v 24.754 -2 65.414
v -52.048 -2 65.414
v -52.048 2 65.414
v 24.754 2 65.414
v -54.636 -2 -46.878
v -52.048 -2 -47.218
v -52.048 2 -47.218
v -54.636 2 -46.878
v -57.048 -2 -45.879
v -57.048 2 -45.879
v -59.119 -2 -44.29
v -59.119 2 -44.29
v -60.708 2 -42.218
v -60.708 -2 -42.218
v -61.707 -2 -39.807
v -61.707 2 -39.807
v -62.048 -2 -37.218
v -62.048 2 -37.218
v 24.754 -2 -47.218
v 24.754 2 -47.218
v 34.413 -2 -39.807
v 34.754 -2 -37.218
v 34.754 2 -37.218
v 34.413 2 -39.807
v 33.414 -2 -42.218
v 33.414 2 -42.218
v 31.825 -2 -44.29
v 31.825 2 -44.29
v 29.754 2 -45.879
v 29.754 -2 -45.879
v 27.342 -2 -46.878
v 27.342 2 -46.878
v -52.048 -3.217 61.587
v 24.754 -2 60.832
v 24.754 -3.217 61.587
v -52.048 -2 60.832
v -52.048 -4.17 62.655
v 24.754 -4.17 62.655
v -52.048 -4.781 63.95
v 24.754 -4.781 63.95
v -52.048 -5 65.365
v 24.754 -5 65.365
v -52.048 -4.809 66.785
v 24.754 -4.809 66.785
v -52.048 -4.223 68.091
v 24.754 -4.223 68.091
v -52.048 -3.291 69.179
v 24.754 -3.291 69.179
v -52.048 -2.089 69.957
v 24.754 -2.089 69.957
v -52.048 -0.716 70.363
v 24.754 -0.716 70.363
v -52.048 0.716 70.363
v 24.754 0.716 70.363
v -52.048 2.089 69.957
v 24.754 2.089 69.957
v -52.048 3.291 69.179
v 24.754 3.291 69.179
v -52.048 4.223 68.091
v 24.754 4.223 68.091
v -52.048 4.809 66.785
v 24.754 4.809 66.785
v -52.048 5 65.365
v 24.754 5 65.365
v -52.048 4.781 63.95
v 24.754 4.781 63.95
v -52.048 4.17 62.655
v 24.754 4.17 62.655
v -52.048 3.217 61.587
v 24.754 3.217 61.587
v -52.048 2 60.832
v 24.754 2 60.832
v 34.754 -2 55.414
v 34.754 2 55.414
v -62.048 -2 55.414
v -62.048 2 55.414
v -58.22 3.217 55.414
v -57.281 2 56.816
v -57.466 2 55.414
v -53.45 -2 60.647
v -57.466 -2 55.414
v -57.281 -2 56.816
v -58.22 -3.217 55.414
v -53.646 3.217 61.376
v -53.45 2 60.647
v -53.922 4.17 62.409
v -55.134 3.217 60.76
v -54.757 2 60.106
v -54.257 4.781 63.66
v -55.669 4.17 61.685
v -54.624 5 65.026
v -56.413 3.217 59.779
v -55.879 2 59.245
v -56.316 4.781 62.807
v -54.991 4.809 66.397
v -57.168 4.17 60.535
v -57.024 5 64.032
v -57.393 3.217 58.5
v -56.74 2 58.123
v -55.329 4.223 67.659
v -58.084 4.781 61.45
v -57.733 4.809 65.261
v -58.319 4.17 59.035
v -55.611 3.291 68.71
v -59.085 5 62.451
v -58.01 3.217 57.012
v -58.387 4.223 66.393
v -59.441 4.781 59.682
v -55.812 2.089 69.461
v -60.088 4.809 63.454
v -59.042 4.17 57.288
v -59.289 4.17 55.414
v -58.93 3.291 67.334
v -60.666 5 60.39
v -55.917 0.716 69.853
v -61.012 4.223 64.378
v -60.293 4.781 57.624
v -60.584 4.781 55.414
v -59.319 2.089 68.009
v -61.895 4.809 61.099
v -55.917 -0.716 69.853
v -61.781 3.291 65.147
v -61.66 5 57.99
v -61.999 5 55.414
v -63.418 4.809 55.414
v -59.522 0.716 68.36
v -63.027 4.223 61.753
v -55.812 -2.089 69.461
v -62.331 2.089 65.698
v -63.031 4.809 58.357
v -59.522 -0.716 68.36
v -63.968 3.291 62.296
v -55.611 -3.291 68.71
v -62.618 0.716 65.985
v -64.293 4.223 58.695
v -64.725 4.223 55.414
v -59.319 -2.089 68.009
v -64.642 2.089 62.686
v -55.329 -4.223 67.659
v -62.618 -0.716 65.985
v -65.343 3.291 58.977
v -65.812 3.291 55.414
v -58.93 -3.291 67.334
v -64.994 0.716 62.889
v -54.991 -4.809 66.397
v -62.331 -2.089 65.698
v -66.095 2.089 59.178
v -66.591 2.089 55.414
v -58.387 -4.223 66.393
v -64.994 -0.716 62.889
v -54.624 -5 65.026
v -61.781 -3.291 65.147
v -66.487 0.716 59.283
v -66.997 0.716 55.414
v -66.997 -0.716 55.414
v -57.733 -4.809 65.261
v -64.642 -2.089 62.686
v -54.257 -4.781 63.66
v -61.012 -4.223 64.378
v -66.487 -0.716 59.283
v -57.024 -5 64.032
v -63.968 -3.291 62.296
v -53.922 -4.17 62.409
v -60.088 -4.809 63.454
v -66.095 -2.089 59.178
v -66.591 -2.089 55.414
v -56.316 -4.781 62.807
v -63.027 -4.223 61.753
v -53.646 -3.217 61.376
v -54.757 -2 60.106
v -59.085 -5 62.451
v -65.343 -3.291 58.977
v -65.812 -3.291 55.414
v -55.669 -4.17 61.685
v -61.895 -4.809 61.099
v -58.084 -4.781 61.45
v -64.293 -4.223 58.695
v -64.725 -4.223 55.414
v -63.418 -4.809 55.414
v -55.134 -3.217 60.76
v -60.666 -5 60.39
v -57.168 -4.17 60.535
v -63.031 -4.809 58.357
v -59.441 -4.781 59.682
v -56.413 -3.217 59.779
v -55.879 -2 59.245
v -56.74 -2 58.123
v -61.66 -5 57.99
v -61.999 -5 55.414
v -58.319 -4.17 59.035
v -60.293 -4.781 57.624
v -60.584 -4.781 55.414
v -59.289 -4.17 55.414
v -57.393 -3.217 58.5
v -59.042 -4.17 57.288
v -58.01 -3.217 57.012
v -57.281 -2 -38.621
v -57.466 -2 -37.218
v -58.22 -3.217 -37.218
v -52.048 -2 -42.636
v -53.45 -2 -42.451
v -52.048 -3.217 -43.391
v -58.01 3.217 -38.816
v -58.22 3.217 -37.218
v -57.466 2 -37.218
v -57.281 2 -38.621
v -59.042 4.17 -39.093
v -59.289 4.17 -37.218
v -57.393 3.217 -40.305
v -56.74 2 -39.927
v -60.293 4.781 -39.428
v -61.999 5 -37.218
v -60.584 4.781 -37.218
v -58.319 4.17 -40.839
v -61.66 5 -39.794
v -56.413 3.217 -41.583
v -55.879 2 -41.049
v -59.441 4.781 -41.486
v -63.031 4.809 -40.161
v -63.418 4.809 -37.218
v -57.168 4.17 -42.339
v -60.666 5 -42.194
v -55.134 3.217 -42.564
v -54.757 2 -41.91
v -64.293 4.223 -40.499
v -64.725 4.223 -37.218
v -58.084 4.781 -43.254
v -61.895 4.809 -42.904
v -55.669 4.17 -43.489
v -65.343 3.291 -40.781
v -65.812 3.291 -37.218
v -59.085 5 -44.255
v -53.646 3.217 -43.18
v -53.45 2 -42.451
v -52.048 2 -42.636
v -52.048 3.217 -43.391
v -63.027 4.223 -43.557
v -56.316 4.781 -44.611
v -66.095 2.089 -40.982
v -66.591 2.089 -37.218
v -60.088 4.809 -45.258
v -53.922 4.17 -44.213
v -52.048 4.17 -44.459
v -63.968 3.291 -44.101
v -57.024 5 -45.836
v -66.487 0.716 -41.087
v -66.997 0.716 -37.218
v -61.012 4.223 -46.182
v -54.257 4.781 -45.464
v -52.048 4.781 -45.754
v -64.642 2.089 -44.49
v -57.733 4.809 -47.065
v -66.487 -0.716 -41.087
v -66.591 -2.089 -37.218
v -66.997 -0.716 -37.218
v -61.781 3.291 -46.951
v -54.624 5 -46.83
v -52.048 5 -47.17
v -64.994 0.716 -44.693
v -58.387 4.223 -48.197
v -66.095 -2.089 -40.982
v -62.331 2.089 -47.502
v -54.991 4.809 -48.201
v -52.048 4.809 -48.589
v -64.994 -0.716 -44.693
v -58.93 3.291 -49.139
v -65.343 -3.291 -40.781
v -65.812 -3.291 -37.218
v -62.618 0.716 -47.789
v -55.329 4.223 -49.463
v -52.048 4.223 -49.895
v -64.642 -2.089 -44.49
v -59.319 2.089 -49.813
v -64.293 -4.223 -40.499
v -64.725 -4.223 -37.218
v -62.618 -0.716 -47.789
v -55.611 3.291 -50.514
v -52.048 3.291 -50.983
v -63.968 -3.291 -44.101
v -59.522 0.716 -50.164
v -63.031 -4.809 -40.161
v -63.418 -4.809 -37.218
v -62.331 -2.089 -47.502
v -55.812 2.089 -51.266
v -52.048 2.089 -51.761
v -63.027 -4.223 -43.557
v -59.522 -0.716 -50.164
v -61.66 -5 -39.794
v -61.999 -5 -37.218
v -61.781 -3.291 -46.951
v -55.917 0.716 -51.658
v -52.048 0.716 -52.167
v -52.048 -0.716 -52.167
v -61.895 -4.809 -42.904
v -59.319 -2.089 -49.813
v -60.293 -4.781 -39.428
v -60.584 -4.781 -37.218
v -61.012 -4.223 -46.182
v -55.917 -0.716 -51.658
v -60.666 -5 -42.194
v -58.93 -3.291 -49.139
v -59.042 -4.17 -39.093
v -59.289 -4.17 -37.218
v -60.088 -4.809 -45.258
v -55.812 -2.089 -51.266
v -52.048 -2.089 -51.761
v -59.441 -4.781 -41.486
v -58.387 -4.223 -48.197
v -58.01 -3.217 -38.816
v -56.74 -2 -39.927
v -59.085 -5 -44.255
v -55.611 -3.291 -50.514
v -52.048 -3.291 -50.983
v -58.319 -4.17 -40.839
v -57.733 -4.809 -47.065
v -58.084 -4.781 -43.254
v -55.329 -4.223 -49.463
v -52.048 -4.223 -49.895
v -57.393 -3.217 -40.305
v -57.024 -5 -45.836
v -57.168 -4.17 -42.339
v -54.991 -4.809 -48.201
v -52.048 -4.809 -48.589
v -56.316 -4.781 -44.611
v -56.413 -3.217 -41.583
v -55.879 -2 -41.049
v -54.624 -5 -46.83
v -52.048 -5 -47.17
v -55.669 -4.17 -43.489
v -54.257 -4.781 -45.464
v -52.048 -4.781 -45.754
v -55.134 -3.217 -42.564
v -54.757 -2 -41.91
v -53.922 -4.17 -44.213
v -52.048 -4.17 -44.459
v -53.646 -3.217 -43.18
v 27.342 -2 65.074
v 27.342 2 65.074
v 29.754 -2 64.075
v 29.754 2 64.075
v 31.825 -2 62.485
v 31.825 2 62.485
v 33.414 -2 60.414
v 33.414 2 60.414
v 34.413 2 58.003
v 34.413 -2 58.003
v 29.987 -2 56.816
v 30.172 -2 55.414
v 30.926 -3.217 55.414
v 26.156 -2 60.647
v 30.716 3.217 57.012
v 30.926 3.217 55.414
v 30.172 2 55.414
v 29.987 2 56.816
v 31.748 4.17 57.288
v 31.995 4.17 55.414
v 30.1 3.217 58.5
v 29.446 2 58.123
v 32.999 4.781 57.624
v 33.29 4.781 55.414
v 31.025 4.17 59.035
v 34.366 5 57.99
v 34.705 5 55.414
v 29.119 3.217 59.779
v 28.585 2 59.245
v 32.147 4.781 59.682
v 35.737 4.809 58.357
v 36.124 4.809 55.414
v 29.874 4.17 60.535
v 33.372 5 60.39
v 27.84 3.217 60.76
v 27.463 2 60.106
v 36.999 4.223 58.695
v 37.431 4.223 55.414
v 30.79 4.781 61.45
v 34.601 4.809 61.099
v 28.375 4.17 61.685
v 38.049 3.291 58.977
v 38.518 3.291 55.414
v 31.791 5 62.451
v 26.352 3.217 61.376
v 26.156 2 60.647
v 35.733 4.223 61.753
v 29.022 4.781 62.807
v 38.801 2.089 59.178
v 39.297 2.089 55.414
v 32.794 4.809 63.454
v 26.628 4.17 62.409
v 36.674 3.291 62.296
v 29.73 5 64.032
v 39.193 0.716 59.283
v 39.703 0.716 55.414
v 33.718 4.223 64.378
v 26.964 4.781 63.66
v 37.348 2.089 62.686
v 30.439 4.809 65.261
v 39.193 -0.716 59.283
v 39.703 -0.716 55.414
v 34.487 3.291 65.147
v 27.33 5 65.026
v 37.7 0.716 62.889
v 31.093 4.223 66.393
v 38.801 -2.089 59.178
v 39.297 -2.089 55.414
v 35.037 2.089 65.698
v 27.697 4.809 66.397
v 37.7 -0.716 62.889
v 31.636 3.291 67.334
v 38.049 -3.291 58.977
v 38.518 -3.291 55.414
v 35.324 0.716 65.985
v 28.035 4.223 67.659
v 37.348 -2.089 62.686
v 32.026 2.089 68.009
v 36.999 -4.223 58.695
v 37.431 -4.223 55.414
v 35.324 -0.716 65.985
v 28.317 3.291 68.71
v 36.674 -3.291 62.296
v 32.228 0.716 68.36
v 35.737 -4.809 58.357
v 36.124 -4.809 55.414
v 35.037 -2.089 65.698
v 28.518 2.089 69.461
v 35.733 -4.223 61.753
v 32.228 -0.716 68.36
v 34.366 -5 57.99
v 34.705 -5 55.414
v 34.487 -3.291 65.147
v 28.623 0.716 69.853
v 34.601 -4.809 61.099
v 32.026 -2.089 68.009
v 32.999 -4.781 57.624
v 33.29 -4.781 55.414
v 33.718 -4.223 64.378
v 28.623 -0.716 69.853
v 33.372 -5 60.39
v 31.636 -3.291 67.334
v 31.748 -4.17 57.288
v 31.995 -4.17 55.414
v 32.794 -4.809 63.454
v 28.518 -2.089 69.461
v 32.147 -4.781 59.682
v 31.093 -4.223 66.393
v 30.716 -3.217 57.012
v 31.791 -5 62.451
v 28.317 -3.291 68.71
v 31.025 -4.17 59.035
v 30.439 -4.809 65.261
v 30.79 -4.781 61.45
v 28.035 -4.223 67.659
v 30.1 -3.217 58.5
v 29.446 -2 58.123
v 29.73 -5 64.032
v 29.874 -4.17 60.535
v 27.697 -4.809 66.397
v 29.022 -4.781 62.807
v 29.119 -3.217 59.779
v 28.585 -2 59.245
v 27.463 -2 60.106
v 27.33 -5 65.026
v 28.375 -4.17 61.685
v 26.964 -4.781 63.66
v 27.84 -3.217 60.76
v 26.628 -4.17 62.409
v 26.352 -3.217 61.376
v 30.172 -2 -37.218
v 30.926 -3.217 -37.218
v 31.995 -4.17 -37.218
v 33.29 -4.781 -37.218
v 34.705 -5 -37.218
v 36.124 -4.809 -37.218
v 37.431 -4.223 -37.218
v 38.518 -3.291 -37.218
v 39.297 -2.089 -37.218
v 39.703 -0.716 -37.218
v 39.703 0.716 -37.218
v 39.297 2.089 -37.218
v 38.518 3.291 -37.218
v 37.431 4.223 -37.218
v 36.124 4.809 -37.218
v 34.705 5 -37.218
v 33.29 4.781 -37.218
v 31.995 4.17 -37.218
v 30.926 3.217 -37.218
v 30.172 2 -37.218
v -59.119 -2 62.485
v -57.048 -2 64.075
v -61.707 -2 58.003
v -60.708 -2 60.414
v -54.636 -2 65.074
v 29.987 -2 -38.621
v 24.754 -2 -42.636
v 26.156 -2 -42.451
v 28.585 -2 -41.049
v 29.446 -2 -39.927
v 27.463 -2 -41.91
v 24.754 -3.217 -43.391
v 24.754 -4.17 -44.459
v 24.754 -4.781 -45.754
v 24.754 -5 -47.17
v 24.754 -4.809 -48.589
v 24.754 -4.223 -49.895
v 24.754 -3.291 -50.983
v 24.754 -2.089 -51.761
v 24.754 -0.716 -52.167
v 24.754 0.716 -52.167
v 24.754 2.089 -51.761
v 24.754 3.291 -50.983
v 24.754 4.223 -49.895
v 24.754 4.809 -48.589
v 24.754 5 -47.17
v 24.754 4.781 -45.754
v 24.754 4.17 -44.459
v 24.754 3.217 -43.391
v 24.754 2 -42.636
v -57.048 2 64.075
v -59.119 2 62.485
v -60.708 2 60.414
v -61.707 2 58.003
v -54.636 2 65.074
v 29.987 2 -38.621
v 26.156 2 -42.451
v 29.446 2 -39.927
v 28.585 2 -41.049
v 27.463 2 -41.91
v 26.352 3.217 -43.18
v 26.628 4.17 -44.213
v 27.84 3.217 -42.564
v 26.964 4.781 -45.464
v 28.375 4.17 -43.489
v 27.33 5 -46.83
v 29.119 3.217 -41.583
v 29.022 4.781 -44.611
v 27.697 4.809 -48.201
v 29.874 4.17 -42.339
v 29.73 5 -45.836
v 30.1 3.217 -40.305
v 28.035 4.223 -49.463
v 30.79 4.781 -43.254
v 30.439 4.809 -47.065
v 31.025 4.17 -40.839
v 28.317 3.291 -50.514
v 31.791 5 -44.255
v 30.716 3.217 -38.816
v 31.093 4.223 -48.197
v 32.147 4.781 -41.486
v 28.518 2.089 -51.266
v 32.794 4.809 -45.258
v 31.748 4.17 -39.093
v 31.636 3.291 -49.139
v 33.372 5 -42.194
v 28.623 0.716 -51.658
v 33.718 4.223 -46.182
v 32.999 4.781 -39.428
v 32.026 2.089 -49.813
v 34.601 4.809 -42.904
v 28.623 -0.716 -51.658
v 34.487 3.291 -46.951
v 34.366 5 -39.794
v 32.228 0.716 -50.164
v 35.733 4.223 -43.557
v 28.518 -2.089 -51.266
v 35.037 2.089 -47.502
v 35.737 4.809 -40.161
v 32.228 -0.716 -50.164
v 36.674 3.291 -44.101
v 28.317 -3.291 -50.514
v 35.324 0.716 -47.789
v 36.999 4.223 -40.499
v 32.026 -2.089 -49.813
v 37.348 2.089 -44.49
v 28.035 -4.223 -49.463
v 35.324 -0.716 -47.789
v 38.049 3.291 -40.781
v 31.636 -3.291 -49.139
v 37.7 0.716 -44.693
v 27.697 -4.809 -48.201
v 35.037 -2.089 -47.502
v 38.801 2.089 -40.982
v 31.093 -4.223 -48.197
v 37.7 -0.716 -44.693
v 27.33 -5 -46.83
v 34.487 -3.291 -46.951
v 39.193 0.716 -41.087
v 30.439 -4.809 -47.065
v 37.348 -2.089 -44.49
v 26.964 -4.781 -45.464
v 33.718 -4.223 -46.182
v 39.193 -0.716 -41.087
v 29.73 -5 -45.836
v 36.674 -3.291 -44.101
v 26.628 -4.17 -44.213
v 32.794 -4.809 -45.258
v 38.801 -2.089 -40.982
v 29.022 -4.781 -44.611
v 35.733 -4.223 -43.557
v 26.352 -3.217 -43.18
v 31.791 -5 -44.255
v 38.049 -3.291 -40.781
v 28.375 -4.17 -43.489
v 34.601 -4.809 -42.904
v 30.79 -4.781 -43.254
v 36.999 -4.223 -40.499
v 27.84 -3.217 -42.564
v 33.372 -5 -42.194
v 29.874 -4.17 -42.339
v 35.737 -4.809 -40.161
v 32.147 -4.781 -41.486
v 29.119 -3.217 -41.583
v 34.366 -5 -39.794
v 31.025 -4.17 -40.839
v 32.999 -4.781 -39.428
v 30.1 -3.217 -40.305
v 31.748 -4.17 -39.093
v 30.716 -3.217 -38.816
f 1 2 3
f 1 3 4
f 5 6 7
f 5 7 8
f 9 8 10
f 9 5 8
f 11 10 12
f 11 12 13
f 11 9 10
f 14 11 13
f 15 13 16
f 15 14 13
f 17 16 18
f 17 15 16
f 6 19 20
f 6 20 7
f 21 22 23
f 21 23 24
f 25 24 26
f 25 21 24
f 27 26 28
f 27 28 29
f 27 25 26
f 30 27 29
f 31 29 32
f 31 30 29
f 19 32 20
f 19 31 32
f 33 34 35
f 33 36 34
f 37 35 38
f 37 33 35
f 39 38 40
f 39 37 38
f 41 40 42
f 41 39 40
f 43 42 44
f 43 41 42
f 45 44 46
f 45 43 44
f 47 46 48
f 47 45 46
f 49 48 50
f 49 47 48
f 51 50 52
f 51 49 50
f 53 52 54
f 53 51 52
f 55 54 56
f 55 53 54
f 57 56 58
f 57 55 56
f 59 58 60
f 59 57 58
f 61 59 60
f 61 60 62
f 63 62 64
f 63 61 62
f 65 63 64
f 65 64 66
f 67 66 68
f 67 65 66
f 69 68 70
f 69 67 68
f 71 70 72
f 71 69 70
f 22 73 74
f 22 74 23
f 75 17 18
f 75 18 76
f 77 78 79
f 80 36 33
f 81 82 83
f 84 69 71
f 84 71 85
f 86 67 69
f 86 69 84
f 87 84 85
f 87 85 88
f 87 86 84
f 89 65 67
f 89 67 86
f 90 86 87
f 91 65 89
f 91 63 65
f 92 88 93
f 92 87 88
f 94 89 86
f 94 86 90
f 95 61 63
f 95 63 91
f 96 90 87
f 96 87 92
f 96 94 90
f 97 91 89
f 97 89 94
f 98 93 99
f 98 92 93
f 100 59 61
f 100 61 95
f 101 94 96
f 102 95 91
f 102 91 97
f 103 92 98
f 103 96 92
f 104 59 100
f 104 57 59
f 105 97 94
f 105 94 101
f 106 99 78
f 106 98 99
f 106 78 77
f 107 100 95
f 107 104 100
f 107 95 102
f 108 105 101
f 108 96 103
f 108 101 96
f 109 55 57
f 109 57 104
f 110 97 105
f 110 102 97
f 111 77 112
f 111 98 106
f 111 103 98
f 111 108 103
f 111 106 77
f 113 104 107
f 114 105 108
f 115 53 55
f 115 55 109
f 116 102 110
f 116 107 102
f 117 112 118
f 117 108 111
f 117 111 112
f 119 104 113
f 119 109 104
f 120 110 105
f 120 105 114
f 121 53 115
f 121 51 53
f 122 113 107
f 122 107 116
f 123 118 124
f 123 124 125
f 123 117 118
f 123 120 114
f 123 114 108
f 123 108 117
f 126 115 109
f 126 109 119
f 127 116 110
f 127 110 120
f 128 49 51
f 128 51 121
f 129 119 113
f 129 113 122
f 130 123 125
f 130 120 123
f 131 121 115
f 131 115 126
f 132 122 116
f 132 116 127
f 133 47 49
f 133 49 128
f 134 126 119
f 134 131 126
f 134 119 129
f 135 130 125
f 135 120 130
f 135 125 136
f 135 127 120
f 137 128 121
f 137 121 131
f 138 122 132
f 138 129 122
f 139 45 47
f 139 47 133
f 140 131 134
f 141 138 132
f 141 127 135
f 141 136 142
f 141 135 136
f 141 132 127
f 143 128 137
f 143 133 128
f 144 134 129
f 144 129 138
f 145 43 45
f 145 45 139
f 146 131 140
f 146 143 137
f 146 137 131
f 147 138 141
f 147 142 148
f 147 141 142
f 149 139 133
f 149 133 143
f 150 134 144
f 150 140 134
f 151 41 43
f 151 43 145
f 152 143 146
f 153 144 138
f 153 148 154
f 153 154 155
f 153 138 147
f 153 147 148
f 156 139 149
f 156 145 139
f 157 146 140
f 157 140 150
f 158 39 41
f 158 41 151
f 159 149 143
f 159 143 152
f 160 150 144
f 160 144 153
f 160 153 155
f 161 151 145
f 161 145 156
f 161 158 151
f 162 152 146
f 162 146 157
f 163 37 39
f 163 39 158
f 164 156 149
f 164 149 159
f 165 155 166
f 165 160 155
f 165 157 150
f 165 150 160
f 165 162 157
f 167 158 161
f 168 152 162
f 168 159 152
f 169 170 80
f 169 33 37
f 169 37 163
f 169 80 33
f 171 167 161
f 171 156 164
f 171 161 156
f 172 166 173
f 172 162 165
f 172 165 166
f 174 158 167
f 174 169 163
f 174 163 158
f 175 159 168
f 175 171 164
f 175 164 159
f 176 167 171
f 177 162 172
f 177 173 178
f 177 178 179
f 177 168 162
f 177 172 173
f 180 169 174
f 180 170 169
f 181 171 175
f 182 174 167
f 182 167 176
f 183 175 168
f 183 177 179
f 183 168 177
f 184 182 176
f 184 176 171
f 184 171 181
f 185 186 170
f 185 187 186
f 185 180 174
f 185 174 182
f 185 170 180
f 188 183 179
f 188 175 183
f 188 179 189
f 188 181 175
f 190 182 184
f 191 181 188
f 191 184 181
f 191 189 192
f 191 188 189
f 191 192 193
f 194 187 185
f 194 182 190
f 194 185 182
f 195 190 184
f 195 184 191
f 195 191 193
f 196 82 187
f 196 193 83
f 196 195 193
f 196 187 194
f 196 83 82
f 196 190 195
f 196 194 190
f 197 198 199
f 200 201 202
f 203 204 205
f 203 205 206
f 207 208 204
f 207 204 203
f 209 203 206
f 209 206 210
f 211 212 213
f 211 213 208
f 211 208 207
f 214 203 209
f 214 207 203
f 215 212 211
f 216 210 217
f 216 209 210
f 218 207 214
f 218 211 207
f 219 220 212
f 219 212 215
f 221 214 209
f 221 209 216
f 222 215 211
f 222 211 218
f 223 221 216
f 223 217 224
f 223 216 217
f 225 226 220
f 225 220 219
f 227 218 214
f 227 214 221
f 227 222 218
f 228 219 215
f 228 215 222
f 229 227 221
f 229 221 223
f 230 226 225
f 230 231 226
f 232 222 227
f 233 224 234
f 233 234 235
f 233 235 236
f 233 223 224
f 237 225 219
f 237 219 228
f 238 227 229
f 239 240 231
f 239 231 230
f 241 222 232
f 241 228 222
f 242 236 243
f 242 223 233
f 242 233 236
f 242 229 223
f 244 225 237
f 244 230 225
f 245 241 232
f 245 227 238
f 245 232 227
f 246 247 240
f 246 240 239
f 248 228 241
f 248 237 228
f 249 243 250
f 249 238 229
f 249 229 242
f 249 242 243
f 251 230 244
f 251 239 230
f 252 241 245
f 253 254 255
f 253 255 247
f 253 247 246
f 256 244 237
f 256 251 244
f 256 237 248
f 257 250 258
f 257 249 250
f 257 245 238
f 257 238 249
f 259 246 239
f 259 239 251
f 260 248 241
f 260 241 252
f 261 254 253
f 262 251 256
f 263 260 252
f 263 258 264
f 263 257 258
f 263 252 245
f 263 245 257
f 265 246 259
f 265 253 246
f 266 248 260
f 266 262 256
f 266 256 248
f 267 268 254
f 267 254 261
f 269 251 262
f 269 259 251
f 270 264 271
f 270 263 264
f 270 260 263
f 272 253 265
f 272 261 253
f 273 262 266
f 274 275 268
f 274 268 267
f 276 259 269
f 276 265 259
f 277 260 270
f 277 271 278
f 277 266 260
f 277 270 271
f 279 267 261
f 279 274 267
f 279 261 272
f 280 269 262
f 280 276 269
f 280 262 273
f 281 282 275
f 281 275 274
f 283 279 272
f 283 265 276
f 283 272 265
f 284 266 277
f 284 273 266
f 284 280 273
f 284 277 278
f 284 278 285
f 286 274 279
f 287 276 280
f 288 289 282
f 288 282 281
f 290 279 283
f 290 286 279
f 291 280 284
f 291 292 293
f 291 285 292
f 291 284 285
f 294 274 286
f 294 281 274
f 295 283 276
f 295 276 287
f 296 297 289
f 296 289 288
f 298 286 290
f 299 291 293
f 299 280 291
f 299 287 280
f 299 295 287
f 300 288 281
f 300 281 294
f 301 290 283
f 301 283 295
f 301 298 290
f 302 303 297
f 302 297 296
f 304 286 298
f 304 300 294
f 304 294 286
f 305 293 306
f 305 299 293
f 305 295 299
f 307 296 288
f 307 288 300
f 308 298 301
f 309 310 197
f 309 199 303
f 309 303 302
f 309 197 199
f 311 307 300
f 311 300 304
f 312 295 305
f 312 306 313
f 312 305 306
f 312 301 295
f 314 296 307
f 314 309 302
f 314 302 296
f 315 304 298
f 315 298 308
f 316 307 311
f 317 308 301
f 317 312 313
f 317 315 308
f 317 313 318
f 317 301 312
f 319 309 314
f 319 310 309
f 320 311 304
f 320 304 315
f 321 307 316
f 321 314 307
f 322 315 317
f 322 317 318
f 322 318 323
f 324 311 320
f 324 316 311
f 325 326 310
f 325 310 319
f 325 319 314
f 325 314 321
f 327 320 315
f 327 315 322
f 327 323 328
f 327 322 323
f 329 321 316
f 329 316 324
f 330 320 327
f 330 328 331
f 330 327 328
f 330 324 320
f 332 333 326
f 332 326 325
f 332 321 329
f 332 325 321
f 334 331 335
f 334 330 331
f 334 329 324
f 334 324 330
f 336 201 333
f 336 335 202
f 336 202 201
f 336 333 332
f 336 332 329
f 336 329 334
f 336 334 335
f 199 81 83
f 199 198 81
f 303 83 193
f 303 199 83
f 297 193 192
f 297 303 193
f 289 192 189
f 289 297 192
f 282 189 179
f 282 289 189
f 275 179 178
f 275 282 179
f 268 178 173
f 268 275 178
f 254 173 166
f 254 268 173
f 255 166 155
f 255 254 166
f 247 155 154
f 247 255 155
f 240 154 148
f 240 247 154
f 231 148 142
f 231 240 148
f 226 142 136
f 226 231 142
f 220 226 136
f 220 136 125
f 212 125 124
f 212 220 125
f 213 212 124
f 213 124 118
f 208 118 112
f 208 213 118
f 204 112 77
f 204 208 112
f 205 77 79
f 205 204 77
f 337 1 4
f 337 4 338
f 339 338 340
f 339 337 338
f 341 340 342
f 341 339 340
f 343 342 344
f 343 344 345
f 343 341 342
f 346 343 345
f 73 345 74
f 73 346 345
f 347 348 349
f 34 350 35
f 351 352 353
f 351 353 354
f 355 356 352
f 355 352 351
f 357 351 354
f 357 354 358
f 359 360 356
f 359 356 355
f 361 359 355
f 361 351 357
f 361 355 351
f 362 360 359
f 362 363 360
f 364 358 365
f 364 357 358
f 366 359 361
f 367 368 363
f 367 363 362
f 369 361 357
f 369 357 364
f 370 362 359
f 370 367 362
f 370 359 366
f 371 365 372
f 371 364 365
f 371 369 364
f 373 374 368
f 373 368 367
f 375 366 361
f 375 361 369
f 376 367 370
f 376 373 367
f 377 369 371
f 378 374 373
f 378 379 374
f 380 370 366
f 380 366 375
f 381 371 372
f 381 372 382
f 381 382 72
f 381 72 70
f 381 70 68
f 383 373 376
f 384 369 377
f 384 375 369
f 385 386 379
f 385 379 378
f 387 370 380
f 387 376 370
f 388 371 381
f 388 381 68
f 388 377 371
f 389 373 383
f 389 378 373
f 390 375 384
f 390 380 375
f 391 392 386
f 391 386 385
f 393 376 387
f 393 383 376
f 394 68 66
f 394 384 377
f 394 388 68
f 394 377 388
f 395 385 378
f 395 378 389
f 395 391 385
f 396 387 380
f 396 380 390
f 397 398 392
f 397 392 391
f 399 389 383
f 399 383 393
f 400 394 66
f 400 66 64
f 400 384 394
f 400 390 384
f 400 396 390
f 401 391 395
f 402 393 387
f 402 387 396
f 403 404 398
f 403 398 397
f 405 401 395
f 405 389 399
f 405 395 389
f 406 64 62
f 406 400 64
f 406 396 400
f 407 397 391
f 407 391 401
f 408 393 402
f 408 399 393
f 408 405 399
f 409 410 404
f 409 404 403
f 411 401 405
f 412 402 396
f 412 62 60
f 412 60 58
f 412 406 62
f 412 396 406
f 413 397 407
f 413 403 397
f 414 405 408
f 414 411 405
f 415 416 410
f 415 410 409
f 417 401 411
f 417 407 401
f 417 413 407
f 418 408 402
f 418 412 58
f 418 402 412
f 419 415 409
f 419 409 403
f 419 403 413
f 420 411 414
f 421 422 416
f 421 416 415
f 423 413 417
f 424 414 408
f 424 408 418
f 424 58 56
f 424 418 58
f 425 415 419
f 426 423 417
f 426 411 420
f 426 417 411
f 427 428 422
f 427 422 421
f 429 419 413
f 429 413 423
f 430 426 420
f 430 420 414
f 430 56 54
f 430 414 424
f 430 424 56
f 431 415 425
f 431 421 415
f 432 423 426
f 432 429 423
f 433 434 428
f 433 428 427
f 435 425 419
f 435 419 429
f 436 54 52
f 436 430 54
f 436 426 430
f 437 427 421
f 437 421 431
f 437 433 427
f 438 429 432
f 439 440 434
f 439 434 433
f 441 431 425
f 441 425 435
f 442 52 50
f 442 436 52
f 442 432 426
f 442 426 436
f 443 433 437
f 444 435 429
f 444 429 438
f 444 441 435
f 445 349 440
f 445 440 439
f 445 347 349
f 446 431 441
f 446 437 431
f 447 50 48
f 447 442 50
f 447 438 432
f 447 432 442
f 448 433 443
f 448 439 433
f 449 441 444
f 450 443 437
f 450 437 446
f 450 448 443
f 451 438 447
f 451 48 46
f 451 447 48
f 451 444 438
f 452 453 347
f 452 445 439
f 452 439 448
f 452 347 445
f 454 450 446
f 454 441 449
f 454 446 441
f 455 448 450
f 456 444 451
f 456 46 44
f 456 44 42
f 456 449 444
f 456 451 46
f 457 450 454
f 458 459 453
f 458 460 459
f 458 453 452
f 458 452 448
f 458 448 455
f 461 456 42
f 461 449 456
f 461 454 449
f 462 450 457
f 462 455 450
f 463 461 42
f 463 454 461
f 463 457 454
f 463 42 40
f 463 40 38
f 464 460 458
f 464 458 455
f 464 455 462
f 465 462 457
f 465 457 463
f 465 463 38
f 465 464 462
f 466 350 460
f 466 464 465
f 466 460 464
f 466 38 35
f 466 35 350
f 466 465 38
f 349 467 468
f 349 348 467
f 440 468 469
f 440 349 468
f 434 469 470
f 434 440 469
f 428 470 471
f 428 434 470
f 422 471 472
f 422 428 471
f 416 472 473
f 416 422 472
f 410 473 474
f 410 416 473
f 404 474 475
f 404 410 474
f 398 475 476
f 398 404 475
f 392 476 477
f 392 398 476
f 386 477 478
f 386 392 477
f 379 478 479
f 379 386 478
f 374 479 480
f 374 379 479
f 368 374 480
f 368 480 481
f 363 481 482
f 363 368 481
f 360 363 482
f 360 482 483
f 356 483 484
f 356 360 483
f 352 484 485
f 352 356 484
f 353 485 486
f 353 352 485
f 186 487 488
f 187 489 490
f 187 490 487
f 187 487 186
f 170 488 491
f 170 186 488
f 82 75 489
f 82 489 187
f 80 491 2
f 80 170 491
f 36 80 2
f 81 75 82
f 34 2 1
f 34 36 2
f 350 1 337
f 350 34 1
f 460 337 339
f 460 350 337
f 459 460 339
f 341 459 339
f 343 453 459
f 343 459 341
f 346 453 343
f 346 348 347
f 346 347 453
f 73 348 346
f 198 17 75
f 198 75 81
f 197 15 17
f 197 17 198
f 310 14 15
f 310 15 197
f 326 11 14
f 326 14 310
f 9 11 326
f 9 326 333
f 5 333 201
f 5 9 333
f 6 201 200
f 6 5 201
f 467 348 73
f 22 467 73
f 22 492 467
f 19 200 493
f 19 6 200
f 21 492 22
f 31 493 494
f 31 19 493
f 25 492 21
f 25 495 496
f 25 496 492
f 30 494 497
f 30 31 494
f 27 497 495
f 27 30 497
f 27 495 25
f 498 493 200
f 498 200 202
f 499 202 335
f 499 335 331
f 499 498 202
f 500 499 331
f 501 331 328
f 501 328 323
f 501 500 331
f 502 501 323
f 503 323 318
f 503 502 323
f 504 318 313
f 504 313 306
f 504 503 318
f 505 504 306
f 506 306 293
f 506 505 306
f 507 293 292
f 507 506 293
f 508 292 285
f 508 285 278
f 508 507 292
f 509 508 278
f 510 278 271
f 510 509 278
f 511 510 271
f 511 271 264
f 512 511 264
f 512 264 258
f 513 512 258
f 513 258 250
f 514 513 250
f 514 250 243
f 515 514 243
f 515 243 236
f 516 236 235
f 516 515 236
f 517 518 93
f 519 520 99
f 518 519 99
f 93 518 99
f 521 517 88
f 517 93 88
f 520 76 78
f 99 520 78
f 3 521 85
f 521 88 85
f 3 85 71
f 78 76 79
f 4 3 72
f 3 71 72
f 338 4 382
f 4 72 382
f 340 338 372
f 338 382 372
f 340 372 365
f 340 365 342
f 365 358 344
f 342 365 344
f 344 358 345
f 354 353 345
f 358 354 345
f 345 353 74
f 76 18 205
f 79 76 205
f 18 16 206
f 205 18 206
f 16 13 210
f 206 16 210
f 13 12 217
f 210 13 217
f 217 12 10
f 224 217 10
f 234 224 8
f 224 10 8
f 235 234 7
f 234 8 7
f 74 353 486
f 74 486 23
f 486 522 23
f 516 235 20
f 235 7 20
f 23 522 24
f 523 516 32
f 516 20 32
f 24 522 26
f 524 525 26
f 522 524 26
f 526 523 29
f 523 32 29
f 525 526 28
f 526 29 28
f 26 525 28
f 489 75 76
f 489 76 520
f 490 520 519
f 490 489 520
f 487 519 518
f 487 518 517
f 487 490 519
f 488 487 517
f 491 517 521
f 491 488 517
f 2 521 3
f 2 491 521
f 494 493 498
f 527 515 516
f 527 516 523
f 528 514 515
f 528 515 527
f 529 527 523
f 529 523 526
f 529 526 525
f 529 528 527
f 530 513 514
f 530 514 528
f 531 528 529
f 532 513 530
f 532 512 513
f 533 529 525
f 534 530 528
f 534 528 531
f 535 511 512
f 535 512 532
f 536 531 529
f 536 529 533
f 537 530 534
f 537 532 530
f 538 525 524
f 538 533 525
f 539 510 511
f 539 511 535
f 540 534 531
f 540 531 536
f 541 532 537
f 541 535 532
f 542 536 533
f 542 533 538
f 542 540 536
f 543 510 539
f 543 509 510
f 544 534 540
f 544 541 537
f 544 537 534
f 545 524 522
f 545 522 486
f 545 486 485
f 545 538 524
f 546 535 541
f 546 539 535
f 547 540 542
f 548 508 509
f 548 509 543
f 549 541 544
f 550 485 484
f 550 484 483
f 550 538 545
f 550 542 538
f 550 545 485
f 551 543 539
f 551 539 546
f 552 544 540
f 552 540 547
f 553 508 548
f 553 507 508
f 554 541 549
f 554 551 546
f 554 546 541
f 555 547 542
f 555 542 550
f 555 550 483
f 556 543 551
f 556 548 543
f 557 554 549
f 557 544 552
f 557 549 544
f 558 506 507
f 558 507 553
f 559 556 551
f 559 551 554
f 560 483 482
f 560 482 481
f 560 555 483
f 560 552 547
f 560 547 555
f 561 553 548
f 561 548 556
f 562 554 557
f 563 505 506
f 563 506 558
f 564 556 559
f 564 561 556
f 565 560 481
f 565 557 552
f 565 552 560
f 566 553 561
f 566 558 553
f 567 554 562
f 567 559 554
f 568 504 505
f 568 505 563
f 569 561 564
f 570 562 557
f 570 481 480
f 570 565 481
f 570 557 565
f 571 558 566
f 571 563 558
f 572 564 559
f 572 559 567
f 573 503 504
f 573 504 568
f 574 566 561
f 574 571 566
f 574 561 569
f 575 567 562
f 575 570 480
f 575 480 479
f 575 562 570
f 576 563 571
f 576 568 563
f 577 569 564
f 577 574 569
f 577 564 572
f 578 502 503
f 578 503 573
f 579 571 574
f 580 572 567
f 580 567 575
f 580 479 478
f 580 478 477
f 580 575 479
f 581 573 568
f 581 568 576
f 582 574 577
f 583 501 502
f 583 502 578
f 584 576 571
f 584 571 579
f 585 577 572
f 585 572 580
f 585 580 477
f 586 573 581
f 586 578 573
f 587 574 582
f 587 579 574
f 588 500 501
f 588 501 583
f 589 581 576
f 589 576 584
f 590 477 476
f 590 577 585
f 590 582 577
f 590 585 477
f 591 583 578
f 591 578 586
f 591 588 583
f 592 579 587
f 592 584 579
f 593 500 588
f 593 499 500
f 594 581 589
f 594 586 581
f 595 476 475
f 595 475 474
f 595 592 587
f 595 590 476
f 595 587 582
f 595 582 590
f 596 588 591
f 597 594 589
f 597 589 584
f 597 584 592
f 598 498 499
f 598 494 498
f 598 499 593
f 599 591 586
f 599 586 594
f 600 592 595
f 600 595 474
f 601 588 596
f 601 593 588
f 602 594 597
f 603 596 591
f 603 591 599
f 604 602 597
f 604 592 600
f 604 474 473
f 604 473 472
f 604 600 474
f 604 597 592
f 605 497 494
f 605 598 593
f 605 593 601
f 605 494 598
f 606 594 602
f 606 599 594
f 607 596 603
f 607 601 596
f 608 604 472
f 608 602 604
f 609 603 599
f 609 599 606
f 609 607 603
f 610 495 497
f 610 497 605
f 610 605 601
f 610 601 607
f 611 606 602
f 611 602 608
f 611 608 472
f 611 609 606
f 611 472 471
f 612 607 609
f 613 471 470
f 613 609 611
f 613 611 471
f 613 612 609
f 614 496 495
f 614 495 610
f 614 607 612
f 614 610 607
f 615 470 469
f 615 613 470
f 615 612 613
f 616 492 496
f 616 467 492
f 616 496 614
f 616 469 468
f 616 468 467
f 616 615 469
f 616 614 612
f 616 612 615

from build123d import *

# Parameters (mm, degrees)
BOSS_EXTRUDE1_DEPTH = 2
SWEEP2_PROFILE_R    = 5
INTERSECT1_START    = -2
INTERSECT1_DEPTH    = 4


# Read off the part's stored shape, not the designer's step: Intersect1
with BuildPart() as part:
    # Sketch1 → Boss-Extrude1 (new, symmetric)
    with BuildSketch(Plane(origin=(0, 0, 0), x_dir=(1, 0, 0), z_dir=(0, 1, 0))):
        with BuildLine():
            Line((-52.048116563, 47.218434745), (24.754223647, 47.218434745))
            ThreePointArc((24.754223647, 47.218434745), (31.825291459, 44.289502557), (34.754223647, 37.218434745))
            Line((34.754223647, 37.218434745), (34.754223647, -55.414363356))
            ThreePointArc((34.754223647, -55.414363356), (31.825291459, -62.485431168), (24.754223647, -65.414363356))
            Line((24.754223647, -65.414363356), (-52.048116563, -65.414363356))
            ThreePointArc((-52.048116563, -65.414363356), (-59.119184375, -62.485431168), (-62.048116563, -55.414363356))
            Line((-62.048116563, -55.414363356), (-62.048116563, 37.218434745))
            ThreePointArc((-62.048116563, 37.218434745), (-59.119184375, 44.289502557), (-52.048116563, 47.218434745))
        make_face()
    extrude(amount=BOSS_EXTRUDE1_DEPTH, both=True)


with BuildPart() as body_2:
    # Sweep2: sweep along a path in Sketch1<3>
    with BuildLine(Plane(origin=(0, 0, 0), x_dir=(1, 0, 0), z_dir=(0, 1, 0))) as sweep2_path:
        Line((-52.048116563, 47.218434745), (24.754223647, 47.218434745))
        ThreePointArc((24.754223647, 47.218434745), (31.825291459, 44.289502557), (34.754223647, 37.218434745))
        Line((34.754223647, 37.218434745), (34.754223647, -55.414363356))
        ThreePointArc((34.754223647, -55.414363356), (31.825291459, -62.485431168), (24.754223647, -65.414363356))
        Line((24.754223647, -65.414363356), (-52.048116563, -65.414363356))
        ThreePointArc((-52.048116563, -65.414363356), (-59.119184375, -62.485431168), (-62.048116563, -55.414363356))
        Line((-62.048116563, -55.414363356), (-62.048116563, 37.218434745))
        ThreePointArc((-62.048116563, 37.218434745), (-59.119184375, 44.289502557), (-52.048116563, 47.218434745))
    # Sweep2 profile (on start of the path) → Sweep2 (sweep)
    with BuildSketch(Plane(origin=(-52.048116563, 0, -47.218434745), x_dir=(0, 0, 1), z_dir=(1, 0, 0))):
        Circle(SWEEP2_PROFILE_R)
    sweep(path=sweep2_path.line)


with BuildPart() as intersect1_tool:
    # Intersect1 outline → Intersect1 (new body)
    with BuildSketch(Plane(origin=(0, 0, 0), x_dir=(1, 0, 0), z_dir=(0, 1, 0)).offset(INTERSECT1_START)):
        with BuildLine():
            ThreePointArc((-52.048116563, 47.218434745), (-59.119184375, 44.289502557), (-62.048116563, 37.218434745))
            Line((-62.048116563, 37.218434745), (-62.048116563, -55.414363356))
            ThreePointArc((-62.048116563, -55.414363356), (-59.119184375, -62.485431168), (-52.048116563, -65.414363356))
            Line((-52.048116563, -65.414363356), (24.754223647, -65.414363356))
            ThreePointArc((24.754223647, -65.414363356), (31.825291459, -62.485431168), (34.754223647, -55.414363356))
            Line((34.754223647, -55.414363356), (34.754223647, 37.218434745))
            ThreePointArc((34.754223647, 37.218434745), (31.825291459, 44.289502557), (24.754223647, 47.218434745))
            Line((24.754223647, 47.218434745), (-52.048116563, 47.218434745))
        make_face()
    extrude(amount=INTERSECT1_DEPTH)


with BuildPart() as part_1:
    add(part.part)

    # Intersect1: cut by intersect1_tool
    add(intersect1_tool.part, mode=Mode.SUBTRACT)


with BuildPart() as body_2_1:
    add(body_2.part)

    # Intersect1: cut by intersect1_tool
    add(intersect1_tool.part, mode=Mode.SUBTRACT)


solid = body_2_1.part
